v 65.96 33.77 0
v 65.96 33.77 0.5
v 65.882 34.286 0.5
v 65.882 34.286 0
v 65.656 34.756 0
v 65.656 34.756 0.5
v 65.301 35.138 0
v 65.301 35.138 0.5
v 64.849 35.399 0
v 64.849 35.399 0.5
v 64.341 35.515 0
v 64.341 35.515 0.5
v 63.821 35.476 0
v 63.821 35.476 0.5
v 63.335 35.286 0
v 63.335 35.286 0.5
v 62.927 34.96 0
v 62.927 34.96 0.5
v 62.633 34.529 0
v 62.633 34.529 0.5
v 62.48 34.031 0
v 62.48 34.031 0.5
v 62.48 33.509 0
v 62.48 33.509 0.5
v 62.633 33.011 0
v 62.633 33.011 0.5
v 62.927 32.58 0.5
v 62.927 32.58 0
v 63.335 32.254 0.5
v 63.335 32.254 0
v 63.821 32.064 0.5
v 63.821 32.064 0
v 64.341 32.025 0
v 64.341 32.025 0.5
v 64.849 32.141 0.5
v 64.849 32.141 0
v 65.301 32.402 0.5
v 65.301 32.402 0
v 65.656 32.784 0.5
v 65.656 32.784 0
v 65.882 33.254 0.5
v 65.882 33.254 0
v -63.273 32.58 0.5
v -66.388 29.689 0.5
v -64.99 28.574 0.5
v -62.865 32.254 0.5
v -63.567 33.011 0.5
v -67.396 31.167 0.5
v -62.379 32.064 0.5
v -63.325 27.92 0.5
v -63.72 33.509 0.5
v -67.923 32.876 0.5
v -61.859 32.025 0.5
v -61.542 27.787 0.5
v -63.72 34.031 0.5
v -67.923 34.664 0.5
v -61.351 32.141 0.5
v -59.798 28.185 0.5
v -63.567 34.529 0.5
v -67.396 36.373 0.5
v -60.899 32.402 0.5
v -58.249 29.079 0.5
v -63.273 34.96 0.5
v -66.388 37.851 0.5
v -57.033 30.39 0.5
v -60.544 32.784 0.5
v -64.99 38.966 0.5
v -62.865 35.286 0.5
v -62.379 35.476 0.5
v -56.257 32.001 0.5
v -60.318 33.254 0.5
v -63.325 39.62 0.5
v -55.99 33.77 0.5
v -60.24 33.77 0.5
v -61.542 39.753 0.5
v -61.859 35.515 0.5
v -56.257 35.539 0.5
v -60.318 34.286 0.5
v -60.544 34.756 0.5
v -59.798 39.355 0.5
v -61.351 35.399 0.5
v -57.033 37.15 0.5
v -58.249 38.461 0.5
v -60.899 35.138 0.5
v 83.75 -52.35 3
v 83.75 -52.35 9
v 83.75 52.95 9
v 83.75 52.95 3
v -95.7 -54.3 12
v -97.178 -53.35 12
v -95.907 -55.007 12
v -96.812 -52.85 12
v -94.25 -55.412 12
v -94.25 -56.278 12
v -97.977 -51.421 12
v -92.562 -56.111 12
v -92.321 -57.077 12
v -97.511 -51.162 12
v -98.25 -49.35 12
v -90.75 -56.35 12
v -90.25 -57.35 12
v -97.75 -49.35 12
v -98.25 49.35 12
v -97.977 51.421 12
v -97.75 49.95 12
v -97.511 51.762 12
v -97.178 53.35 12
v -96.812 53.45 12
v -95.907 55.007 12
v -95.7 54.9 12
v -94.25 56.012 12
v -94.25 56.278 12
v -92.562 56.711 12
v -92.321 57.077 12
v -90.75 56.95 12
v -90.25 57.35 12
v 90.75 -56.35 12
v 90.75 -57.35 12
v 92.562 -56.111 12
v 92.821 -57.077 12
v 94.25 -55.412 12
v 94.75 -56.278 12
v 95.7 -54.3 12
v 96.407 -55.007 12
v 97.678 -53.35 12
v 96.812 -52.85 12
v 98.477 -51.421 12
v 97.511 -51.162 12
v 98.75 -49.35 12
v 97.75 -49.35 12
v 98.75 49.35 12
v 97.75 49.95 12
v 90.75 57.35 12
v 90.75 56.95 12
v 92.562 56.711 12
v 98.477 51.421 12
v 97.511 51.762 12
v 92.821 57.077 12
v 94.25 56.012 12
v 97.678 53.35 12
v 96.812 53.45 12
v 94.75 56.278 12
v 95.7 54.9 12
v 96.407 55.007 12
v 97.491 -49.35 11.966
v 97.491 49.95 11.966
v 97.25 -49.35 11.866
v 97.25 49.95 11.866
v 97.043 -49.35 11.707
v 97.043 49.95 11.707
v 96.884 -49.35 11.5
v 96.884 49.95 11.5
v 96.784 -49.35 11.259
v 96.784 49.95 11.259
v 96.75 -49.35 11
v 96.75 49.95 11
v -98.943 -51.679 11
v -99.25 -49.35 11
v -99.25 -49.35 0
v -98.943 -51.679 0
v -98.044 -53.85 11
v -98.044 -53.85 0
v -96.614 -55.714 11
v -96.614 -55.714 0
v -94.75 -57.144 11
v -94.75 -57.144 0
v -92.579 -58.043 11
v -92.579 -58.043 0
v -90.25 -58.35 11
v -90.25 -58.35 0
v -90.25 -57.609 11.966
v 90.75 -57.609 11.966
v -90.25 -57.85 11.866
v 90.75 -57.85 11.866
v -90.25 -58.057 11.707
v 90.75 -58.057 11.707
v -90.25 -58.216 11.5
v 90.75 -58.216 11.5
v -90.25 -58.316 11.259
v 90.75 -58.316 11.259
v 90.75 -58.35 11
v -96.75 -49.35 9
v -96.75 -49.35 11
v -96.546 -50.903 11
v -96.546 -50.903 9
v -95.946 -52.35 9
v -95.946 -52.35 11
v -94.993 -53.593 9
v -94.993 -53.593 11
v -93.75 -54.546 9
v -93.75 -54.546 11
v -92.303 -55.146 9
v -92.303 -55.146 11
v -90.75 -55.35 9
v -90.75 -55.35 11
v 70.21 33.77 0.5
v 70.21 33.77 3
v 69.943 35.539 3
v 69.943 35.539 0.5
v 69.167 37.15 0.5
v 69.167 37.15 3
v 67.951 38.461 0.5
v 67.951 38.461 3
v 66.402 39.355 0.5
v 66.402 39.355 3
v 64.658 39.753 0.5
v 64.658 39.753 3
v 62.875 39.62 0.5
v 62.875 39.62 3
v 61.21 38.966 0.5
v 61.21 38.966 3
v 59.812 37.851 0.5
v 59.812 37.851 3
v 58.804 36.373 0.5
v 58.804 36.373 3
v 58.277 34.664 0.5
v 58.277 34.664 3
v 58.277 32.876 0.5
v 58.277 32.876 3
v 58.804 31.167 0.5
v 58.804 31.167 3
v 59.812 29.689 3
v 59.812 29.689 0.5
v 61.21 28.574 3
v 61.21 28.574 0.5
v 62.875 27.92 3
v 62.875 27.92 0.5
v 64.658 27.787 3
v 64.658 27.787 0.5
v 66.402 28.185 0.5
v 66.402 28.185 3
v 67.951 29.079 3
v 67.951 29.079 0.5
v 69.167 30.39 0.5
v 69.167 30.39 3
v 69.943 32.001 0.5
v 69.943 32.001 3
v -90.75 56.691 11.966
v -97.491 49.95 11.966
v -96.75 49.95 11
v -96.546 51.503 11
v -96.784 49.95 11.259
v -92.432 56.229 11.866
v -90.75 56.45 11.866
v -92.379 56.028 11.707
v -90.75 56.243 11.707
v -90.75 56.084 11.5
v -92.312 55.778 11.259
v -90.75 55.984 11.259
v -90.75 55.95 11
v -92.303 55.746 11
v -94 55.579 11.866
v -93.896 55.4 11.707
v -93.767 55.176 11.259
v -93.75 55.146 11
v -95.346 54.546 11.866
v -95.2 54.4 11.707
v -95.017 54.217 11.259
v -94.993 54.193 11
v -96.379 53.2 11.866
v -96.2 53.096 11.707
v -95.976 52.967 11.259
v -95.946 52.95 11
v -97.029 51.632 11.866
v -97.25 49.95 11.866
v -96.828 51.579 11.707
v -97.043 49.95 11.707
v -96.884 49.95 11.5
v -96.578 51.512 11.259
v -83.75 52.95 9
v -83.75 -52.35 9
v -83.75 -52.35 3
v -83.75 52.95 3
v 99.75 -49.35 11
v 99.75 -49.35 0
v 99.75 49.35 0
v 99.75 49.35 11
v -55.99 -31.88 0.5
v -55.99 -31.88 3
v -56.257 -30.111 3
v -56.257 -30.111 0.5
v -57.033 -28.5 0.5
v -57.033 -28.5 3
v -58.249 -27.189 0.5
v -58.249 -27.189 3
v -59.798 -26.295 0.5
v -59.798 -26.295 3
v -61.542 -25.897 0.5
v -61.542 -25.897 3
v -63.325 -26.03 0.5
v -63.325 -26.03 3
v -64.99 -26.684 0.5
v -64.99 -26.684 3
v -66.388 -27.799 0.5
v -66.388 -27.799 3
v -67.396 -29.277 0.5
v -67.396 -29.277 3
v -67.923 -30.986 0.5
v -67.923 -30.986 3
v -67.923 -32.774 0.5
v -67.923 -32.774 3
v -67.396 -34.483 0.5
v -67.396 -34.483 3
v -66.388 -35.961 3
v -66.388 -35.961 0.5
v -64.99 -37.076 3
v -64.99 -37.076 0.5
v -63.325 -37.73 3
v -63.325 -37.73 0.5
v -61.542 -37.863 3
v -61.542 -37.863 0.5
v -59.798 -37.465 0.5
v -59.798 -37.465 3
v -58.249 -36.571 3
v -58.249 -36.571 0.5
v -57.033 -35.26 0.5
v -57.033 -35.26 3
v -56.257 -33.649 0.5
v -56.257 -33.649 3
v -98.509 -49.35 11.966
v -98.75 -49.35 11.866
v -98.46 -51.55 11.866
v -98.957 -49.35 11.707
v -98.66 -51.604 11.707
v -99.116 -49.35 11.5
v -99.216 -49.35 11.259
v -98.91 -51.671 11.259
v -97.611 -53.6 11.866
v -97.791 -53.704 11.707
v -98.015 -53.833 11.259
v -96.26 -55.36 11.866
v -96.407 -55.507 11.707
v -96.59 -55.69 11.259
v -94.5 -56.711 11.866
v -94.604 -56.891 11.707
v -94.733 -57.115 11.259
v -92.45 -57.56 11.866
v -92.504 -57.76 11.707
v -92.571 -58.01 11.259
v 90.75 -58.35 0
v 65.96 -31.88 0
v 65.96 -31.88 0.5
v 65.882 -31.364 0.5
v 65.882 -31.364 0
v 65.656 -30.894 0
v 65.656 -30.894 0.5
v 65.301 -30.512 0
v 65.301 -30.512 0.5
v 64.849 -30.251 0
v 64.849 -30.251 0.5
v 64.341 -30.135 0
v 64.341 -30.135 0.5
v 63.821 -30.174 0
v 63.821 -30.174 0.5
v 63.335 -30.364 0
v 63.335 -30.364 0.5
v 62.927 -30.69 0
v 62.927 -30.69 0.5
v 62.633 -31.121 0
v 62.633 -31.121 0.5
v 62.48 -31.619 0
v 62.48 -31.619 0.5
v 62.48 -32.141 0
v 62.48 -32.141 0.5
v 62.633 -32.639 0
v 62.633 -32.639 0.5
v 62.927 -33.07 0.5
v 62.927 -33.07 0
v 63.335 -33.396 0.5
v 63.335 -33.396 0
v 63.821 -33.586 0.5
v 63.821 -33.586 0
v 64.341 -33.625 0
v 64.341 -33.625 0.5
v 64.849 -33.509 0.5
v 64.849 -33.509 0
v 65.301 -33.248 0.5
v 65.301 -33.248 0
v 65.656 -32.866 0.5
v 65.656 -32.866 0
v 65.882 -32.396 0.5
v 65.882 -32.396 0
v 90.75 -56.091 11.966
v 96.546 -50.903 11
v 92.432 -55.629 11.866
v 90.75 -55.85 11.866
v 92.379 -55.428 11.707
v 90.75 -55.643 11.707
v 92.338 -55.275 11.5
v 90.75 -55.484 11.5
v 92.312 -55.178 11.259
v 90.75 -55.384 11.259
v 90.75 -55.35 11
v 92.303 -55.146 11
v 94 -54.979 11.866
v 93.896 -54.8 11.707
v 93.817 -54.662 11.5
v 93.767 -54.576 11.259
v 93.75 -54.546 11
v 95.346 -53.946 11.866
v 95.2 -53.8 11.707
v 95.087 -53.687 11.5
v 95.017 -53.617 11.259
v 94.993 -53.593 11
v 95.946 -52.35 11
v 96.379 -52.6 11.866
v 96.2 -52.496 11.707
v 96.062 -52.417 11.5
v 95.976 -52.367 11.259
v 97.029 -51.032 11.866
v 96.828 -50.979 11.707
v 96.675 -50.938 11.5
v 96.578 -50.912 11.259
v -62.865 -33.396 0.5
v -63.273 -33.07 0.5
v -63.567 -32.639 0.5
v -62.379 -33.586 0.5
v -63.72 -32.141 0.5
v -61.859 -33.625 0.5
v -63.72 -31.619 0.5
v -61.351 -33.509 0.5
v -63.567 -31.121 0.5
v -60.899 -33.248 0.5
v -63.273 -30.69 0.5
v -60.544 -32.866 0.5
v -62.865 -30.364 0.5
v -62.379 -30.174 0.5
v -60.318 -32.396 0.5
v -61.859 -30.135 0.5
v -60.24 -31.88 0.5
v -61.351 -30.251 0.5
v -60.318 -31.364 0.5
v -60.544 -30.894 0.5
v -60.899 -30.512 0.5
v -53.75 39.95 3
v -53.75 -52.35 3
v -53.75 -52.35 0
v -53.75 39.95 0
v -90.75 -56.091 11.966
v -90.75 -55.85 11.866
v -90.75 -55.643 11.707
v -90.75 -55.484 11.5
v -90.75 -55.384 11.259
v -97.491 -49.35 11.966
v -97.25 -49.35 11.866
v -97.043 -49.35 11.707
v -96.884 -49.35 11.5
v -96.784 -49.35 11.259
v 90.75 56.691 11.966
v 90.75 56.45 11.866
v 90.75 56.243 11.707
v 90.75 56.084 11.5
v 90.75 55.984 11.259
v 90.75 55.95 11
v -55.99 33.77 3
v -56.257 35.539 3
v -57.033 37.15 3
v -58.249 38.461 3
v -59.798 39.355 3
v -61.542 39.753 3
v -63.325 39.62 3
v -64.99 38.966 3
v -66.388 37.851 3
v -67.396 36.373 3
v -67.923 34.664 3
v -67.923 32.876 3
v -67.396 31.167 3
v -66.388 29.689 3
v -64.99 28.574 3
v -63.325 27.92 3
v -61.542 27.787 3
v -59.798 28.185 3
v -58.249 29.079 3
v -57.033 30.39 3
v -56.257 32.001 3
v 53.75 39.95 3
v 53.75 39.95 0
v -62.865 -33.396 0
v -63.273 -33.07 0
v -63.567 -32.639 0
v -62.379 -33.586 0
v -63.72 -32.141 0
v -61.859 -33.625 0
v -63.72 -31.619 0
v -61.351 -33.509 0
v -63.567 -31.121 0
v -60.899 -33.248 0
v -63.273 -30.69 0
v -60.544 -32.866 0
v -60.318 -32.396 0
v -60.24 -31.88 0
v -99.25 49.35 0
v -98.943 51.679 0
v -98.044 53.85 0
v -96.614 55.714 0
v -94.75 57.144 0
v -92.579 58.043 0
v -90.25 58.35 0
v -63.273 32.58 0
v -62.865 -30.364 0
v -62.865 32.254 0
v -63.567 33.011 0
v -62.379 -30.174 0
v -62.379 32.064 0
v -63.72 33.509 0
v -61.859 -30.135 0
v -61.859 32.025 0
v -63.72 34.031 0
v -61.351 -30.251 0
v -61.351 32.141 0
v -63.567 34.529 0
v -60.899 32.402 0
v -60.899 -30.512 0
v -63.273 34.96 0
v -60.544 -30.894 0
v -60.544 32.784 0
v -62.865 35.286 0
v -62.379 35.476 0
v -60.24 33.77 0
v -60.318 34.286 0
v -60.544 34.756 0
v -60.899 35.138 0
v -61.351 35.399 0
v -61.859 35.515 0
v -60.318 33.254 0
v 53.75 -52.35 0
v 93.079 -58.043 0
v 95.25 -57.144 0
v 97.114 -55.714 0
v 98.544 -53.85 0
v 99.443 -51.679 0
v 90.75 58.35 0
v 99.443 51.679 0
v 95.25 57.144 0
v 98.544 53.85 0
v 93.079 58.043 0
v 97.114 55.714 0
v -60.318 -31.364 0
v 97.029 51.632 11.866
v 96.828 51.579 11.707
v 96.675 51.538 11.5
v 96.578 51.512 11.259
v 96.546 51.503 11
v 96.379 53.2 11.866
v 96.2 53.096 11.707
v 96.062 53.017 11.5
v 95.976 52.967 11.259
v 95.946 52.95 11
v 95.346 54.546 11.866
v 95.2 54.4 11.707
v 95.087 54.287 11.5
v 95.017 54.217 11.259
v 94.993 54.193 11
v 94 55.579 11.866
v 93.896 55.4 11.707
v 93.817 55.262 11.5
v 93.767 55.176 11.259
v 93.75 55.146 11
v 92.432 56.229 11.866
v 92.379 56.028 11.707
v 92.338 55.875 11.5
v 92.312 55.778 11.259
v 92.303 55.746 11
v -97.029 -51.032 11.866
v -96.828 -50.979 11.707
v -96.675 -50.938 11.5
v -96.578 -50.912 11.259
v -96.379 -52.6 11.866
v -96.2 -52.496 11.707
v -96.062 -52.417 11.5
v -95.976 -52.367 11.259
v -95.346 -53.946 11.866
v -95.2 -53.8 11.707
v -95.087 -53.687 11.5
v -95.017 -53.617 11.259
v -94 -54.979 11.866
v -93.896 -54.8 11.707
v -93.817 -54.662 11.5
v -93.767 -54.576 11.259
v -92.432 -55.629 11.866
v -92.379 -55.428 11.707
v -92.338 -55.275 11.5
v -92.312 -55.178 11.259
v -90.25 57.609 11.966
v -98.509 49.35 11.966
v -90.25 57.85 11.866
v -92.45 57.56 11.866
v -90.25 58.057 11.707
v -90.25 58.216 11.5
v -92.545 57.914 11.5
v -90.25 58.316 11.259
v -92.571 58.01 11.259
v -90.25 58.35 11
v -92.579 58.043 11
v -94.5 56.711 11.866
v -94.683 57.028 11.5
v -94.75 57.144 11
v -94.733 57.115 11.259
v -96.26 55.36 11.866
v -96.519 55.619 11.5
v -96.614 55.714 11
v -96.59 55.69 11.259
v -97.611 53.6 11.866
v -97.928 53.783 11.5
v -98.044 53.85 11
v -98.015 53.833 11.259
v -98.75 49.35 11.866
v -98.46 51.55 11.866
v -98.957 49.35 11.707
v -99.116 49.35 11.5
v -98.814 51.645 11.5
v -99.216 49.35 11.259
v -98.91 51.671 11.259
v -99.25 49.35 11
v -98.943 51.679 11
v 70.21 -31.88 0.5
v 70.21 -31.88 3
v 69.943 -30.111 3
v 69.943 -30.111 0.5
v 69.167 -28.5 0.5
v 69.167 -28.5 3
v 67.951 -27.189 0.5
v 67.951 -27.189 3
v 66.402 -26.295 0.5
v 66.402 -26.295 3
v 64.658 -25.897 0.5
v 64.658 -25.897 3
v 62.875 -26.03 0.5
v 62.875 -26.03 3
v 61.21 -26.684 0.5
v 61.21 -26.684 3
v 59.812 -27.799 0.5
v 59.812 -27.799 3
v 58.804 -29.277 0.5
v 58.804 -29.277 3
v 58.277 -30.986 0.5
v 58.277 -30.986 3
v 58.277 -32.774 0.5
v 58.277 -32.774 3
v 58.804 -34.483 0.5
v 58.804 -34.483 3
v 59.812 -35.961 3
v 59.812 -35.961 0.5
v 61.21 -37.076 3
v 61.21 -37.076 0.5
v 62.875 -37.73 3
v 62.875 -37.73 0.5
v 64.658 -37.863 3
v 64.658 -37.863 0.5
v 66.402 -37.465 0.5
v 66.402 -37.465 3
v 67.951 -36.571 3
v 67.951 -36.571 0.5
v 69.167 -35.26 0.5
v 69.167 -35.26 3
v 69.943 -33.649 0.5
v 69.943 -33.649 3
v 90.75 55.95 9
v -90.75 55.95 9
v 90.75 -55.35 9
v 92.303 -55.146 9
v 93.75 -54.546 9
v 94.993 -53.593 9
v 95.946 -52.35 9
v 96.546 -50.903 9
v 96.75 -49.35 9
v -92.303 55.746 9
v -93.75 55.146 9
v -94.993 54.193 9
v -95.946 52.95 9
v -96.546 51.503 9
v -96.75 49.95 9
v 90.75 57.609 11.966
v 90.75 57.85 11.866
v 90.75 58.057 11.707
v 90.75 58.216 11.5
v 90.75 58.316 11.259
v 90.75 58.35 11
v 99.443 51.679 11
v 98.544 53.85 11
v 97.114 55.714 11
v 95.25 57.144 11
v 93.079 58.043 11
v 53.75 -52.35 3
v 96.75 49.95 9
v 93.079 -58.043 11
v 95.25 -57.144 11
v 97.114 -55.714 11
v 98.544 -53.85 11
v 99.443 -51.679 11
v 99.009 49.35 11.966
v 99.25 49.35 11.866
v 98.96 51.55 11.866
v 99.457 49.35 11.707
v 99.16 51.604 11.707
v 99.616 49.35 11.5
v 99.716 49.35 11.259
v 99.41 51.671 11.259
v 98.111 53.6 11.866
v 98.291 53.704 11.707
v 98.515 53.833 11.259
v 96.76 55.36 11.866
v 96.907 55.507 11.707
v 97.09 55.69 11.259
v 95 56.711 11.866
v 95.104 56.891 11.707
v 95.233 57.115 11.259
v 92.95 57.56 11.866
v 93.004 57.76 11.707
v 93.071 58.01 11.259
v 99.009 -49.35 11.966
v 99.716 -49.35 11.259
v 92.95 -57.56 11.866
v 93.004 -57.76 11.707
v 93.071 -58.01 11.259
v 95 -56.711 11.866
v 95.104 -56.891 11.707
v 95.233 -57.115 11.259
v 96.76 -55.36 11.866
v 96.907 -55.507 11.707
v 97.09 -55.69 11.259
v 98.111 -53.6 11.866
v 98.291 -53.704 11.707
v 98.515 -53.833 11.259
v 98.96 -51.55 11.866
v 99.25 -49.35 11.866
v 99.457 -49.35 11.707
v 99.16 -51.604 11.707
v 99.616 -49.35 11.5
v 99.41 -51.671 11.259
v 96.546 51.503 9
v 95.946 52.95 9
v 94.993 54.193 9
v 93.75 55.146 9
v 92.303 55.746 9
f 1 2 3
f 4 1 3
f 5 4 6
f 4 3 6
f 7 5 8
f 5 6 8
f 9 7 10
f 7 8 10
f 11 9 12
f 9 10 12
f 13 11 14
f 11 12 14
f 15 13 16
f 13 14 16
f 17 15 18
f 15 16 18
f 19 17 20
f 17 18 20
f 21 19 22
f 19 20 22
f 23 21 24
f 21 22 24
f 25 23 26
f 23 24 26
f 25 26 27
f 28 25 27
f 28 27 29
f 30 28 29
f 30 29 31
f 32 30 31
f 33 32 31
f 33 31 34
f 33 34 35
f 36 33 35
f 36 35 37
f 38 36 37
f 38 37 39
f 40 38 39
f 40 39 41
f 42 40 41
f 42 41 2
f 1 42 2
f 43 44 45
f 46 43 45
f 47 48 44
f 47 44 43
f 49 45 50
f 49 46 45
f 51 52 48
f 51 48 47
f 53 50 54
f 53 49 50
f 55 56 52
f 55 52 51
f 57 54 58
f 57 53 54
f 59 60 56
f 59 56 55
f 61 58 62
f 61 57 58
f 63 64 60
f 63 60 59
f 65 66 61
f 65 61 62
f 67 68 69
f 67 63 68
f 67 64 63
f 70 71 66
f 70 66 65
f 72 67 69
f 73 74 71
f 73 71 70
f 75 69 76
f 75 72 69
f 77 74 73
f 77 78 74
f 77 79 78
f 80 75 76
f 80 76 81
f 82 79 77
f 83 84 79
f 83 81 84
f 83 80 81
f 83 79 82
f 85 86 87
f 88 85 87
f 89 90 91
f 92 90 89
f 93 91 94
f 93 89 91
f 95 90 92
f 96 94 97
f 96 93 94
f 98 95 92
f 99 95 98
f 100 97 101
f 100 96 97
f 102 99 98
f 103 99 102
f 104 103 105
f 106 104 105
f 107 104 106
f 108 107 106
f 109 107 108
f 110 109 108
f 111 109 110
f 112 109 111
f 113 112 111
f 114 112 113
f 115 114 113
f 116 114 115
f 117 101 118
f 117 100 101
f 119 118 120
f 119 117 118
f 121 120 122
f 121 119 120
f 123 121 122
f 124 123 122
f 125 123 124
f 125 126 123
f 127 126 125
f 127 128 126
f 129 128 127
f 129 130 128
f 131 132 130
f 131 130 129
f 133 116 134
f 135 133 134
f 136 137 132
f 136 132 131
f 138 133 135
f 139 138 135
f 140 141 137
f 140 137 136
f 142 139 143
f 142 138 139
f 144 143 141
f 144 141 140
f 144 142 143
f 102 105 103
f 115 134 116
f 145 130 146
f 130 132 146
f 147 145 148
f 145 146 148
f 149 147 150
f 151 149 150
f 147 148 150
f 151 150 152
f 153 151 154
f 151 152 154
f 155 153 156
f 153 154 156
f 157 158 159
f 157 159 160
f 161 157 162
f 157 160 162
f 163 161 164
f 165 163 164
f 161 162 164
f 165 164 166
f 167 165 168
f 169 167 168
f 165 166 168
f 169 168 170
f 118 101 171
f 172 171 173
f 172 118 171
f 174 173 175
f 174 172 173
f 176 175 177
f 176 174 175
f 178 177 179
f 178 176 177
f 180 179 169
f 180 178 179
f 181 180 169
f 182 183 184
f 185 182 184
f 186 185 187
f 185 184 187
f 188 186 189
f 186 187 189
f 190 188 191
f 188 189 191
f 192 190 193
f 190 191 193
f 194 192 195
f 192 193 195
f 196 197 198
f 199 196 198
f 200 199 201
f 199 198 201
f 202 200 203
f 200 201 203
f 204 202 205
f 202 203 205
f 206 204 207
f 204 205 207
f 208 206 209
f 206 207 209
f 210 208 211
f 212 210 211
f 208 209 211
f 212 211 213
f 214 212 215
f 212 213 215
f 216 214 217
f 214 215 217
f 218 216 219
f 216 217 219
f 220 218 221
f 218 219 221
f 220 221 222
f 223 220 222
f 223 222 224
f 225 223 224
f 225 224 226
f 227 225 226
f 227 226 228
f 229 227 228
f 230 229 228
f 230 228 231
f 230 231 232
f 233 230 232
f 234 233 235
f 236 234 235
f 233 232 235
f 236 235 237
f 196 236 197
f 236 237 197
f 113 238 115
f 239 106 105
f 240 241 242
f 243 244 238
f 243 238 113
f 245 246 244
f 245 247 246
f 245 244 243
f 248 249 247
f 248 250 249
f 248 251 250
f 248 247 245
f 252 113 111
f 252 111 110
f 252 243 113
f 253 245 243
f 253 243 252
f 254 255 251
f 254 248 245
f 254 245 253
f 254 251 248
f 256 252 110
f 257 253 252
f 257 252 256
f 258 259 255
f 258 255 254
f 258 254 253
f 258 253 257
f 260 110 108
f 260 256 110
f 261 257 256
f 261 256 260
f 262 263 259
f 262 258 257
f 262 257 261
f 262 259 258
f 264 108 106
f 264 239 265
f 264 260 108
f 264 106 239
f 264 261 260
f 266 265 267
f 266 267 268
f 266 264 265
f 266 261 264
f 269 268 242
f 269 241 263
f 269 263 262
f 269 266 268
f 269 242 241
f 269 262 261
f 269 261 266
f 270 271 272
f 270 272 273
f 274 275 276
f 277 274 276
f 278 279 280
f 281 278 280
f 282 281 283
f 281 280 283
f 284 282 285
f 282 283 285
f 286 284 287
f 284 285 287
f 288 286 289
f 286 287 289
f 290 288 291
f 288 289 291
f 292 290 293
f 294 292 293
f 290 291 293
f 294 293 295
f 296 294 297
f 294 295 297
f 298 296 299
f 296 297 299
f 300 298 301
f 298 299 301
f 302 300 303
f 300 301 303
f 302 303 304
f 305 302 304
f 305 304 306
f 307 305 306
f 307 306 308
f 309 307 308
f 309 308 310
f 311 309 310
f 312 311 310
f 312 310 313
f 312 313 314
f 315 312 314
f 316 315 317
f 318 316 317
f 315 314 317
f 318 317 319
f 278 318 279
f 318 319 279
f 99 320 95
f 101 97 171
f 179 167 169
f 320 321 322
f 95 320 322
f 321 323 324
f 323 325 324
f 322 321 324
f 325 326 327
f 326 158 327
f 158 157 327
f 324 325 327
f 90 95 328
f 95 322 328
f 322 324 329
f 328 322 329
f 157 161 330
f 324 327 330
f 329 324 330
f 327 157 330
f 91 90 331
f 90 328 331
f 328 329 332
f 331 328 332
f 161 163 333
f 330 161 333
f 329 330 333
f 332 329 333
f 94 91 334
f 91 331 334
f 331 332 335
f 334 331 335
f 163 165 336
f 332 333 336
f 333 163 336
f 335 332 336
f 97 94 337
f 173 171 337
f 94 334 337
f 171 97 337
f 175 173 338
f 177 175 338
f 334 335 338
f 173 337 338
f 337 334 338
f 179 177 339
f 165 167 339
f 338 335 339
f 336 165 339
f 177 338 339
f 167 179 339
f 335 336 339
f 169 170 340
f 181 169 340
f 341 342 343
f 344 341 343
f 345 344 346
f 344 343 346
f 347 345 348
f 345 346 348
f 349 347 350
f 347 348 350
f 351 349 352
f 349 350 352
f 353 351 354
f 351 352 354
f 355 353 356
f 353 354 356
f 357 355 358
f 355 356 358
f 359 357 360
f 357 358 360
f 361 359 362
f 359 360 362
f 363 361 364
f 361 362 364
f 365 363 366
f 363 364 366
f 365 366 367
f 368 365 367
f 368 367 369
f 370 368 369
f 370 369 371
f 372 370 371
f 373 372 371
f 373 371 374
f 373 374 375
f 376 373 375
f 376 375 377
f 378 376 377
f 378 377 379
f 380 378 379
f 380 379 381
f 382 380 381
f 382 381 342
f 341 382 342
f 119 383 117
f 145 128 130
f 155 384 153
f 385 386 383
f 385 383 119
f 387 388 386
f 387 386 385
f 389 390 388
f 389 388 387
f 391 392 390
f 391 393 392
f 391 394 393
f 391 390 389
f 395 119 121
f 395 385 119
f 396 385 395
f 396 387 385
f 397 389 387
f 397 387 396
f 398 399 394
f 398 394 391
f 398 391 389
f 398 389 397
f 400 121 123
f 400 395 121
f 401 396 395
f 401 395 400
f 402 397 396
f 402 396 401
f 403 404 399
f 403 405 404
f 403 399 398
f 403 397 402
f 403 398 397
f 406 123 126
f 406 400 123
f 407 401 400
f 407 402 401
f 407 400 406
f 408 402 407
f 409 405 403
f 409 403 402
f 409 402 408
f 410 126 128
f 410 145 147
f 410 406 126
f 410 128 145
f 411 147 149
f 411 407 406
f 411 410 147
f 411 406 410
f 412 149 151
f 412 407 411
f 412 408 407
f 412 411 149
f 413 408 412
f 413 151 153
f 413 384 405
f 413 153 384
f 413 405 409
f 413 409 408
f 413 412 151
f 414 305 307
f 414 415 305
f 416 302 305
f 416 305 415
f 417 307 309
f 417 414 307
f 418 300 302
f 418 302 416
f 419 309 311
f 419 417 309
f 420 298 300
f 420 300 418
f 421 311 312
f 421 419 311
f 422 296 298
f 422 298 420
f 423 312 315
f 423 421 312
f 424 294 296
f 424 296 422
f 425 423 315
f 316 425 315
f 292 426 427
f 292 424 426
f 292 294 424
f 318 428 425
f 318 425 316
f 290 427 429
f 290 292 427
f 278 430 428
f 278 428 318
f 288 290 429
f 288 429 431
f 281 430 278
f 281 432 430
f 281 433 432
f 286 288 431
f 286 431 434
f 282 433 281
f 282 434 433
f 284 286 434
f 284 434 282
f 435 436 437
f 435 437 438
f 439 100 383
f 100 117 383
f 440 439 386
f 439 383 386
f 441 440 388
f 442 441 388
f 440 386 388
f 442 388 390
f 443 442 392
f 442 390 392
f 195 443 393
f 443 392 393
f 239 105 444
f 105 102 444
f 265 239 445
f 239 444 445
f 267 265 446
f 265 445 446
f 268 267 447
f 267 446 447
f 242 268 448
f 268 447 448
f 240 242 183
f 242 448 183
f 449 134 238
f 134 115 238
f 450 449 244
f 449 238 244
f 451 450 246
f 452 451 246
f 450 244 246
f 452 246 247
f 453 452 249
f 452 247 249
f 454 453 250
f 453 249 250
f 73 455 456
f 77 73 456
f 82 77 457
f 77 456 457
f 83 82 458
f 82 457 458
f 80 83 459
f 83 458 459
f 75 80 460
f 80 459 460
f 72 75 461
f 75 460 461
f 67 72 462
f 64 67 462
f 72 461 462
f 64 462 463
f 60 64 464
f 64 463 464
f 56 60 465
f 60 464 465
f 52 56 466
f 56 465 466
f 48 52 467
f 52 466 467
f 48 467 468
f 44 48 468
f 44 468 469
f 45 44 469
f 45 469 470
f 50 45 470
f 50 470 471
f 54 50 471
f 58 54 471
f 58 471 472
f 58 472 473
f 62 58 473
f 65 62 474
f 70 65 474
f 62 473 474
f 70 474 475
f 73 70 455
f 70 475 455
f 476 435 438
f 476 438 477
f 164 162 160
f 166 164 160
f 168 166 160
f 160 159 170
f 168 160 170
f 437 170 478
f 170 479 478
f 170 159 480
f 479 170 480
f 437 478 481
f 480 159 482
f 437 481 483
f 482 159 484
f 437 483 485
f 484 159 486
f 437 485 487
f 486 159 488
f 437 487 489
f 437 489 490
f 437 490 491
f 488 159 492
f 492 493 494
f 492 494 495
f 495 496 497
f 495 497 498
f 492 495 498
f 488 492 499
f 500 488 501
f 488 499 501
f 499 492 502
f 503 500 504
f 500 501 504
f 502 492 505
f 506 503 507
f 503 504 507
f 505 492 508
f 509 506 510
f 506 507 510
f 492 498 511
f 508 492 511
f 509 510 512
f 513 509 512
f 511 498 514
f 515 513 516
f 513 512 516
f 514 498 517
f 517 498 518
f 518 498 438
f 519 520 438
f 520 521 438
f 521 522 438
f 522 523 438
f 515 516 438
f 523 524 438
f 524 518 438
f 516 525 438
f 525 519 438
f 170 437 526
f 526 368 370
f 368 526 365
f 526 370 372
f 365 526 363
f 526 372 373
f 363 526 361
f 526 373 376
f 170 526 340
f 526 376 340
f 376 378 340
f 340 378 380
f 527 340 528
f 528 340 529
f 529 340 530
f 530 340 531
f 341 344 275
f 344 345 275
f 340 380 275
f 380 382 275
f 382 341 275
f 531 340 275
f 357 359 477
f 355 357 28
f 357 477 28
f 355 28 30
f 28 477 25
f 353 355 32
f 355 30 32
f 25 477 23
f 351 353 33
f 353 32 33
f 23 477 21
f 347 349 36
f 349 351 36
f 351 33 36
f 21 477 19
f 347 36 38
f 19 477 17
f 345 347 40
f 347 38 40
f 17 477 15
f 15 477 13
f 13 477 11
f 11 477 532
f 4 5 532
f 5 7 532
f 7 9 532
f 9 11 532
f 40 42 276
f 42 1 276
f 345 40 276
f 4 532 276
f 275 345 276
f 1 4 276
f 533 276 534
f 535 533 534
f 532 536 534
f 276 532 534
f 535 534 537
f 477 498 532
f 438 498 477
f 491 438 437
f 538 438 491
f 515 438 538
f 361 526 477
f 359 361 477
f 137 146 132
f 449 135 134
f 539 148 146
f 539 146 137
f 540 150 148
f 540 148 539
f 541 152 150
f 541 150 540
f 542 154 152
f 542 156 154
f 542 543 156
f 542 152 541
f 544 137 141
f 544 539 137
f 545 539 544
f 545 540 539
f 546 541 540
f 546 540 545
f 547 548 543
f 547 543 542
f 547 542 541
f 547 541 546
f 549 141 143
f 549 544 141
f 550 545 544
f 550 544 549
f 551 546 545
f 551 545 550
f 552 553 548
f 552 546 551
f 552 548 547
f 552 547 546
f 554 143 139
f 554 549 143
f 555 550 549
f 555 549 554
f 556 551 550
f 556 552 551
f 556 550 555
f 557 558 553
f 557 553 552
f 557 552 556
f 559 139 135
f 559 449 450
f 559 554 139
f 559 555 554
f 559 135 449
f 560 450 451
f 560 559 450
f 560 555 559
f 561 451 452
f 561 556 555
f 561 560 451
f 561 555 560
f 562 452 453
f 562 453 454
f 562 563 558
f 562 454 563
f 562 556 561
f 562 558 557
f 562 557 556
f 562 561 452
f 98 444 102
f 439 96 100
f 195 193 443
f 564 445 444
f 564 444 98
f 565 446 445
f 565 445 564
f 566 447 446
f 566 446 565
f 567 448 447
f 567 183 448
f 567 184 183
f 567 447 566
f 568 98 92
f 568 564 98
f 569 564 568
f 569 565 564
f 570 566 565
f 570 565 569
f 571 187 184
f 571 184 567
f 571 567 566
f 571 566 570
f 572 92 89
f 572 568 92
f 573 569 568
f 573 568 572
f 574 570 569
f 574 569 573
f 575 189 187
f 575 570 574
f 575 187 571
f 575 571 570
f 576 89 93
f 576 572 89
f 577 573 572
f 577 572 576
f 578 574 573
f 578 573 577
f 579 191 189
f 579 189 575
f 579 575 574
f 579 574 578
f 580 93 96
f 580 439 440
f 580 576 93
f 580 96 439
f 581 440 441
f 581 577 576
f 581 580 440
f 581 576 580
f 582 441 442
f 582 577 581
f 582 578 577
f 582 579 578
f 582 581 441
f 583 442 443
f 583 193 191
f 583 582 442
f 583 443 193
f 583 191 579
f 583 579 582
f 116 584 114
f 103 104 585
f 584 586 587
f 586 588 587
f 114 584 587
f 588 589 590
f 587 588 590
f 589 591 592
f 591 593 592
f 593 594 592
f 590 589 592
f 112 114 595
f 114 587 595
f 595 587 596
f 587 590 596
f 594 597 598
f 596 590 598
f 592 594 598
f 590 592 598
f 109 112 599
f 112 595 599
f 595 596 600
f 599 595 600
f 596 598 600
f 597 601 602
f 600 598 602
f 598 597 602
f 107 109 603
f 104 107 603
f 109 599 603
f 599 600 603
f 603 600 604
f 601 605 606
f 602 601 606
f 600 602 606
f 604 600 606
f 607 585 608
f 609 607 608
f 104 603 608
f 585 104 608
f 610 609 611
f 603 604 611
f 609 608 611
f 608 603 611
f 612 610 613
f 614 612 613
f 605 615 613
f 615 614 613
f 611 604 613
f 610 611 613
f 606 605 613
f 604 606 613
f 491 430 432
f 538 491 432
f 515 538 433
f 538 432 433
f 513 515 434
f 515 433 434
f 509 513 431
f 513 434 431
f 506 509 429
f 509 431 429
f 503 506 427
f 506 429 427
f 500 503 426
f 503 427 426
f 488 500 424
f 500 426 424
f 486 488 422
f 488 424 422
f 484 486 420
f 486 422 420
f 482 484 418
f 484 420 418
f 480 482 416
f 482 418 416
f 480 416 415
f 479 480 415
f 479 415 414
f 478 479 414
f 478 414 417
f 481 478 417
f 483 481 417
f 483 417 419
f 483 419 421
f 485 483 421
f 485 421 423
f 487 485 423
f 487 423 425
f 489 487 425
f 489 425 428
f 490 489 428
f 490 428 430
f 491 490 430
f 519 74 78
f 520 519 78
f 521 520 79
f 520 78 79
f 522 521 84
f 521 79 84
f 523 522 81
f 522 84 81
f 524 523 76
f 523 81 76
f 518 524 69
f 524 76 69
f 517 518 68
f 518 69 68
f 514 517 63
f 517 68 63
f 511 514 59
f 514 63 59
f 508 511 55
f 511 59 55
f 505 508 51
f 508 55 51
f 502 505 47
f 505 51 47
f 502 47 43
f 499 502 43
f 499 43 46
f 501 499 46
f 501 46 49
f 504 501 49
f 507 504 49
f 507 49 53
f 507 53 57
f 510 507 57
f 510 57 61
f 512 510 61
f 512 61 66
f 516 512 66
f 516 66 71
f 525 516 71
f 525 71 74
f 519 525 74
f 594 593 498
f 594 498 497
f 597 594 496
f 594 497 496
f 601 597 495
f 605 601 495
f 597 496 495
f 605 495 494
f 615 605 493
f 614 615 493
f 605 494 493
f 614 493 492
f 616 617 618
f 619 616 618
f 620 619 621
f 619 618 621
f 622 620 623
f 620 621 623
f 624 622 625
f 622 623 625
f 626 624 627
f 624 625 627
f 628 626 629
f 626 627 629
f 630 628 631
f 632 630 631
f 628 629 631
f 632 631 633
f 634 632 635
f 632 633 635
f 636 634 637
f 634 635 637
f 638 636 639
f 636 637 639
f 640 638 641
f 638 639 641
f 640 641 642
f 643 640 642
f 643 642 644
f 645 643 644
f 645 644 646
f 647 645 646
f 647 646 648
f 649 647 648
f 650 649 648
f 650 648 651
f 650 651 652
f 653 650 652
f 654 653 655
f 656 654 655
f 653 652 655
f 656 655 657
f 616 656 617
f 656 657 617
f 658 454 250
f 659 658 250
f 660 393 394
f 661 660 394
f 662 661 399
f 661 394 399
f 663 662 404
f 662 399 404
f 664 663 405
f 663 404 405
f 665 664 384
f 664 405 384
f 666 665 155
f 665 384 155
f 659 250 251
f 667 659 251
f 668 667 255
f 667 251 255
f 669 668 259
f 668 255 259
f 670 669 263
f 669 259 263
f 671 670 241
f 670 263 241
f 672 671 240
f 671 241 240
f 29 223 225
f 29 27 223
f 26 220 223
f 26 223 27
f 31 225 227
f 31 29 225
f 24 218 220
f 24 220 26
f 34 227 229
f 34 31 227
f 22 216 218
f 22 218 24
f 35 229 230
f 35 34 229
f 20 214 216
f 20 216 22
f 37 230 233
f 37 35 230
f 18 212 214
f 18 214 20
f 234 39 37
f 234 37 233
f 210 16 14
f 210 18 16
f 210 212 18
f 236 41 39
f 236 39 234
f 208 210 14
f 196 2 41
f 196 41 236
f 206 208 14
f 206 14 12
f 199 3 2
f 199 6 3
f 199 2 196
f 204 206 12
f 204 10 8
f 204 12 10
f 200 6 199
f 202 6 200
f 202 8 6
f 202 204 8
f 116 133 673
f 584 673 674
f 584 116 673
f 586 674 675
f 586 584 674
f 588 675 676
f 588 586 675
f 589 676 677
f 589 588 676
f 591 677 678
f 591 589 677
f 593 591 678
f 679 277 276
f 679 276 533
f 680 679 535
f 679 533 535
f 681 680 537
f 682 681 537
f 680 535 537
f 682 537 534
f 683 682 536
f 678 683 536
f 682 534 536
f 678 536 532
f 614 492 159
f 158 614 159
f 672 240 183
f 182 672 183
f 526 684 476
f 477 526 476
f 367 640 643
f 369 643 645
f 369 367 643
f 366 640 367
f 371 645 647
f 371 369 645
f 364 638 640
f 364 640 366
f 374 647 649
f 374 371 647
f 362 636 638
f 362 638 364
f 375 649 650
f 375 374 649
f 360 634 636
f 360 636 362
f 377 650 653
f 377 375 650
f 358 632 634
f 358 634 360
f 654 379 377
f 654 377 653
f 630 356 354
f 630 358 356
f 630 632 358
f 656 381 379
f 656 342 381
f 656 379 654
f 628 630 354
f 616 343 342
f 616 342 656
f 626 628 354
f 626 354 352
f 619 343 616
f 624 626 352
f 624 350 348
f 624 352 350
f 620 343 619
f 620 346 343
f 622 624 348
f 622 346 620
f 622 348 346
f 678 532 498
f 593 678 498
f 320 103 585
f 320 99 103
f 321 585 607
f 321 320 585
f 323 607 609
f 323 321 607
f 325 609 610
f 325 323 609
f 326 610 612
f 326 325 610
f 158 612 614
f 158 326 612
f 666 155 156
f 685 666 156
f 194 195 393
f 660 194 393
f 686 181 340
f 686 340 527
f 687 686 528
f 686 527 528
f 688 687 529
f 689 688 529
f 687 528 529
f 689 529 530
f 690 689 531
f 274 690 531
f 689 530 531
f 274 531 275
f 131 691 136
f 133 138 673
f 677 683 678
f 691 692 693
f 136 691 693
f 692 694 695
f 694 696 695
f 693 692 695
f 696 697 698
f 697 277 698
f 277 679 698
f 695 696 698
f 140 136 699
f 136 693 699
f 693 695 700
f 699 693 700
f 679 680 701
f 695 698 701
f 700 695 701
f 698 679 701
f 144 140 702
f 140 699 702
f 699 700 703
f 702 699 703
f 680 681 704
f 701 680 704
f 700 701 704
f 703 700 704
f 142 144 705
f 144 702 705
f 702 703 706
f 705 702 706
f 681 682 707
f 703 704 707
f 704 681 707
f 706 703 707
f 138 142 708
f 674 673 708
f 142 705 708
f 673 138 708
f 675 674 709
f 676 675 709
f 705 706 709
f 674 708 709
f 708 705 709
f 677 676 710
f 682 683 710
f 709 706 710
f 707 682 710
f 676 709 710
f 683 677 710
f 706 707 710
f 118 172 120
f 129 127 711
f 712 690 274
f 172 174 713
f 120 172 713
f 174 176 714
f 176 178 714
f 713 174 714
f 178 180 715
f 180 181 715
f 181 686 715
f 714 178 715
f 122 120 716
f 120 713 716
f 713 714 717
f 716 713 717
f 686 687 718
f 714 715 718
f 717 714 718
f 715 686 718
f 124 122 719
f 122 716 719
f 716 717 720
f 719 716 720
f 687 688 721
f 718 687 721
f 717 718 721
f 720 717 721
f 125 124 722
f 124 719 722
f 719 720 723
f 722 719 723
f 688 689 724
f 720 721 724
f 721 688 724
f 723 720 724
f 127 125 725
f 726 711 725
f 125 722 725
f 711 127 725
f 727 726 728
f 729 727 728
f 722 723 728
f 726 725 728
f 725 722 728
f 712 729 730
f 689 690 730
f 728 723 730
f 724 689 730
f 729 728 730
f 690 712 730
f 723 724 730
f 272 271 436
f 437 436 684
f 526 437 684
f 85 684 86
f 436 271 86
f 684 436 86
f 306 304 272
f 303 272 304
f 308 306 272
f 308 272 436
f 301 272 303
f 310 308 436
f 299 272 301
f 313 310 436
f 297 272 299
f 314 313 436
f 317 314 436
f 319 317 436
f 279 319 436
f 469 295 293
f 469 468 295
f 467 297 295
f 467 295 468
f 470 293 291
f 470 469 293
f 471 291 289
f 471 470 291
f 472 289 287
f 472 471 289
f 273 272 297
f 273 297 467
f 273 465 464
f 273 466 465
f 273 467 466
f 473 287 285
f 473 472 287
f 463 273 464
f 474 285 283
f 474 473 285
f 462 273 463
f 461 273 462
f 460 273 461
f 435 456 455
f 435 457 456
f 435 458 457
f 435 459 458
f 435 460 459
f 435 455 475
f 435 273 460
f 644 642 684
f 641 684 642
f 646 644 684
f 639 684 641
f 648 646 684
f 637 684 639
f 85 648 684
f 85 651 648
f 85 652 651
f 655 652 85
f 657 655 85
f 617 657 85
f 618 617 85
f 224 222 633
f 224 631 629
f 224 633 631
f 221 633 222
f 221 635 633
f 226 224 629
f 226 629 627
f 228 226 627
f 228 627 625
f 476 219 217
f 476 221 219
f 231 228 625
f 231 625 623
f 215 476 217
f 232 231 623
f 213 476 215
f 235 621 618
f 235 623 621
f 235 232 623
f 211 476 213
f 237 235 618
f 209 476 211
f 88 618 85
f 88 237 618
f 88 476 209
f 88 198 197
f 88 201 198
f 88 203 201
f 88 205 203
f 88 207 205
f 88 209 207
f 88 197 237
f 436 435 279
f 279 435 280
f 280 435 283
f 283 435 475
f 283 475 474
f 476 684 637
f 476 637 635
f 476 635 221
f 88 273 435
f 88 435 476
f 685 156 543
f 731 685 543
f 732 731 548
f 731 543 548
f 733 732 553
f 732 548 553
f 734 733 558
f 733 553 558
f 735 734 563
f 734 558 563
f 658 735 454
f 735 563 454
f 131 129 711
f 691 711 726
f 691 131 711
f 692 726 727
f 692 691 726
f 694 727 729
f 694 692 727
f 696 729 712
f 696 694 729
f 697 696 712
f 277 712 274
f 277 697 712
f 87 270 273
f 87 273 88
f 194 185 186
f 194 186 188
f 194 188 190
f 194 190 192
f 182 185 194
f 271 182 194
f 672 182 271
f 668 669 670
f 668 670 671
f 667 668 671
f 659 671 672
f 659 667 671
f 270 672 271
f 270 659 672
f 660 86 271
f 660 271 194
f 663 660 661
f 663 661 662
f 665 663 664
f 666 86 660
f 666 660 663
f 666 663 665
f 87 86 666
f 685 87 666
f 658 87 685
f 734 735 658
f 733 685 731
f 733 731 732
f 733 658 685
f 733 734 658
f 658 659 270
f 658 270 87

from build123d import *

# Parameters (mm, degrees)
F1_DEPTH  = 12
F2_R      = 1.75
F3_DEPTH  = 25
F4_R      = 1.75
F5_DEPTH  = 3
F6_R      = 1
F7_W      = 167.5
F7_H      = 105.3
F8_DEPTH  = 6
F9_W      = 107.5
F9_H      = 92.3
F10_DEPTH = 6
F11_R     = 6
F12_DEPTH = 2.5


with BuildPart() as f1:
    # F0 (on Top) → F1 (new body)
    with BuildSketch(Plane.XY):
        with BuildLine():
            Line((90.75, 58.35), (-90.25, 58.35))
            ThreePointArc((-90.25, 58.35), (-96.613961, 55.713961), (-99.25, 49.35))
            Line((-99.25, 49.35), (-99.25, -49.35))
            ThreePointArc((-99.25, -49.35), (-96.613961, -55.713961), (-90.25, -58.35))
            Line((-90.25, -58.35), (90.75, -58.35))
            ThreePointArc((90.75, -58.35), (97.113961, -55.713961), (99.75, -49.35))
            Line((99.75, -49.35), (99.75, 49.35))
            ThreePointArc((99.75, 49.35), (97.113961, 55.713961), (90.75, 58.35))
        make_face()
    extrude(amount=F1_DEPTH)

    # F2 (on face) → F3 (cut)
    with BuildSketch(Plane.XY.offset(12)):
        with Locations((-61.99, 33.77)):
            Circle(F2_R)
        with Locations((64.21, 33.77)):
            Circle(F2_R)
        with Locations((64.21, -31.88)):
            Circle(F2_R)
        with Locations((-61.99, -31.88)):
            Circle(F2_R)
    extrude(amount=-F3_DEPTH, mode=Mode.SUBTRACT)

    # F4 (on face) → F5 (cut)
    with BuildSketch(Plane.XY.offset(12)):
        with BuildLine():
            Line((90.75, 55.95), (-90.75, 55.95))
            ThreePointArc((-90.75, 55.95), (-94.992641, 54.192641), (-96.75, 49.95))
            Line((-96.75, 49.95), (-96.75, -49.35))
            ThreePointArc((-96.75, -49.35), (-94.992641, -53.592641), (-90.75, -55.35))
            Line((-90.75, -55.35), (90.75, -55.35))
            ThreePointArc((90.75, -55.35), (94.992641, -53.592641), (96.75, -49.35))
            Line((96.75, -49.35), (96.75, 49.95))
            ThreePointArc((96.75, 49.95), (94.992641, 54.192641), (90.75, 55.95))
        make_face()
        with Locations((-61.99, -31.88)):
            Circle(F4_R, mode=Mode.SUBTRACT)
        with Locations((64.21, -31.88)):
            Circle(F4_R, mode=Mode.SUBTRACT)
        with Locations((-61.99, 33.77)):
            Circle(F4_R, mode=Mode.SUBTRACT)
        with Locations((64.21, 33.77)):
            Circle(F4_R, mode=Mode.SUBTRACT)
    extrude(amount=-F5_DEPTH, mode=Mode.SUBTRACT)

    # F6
    f6_edges = [f1.edges().sort_by_distance(p)[0] for p in [
        (-99.25, 0, 12),
        (-96.75, 0.3, 12),
        (-96.613961, 55.713961, 12),
        (0, 55.95, 12),
        (0.25, 58.35, 12),
        (94.992641, 54.192641, 12),
        (99.75, 0, 12),
        (96.75, 0.3, 12),
        (97.113961, -55.713961, 12),
        (94.992641, -53.592641, 12),
        (0.25, -58.35, 12),
        (0, -55.35, 12),
        (-94.992641, -53.592641, 12),
        (-96.613961, -55.713961, 12),
        (97.113961, 55.713961, 12),
        (-94.992641, 54.192641, 12),
    ]]
    fillet(f6_edges, radius=F6_R)

    # F7 (on face) → F8 (cut)
    with BuildSketch(Plane.XY.offset(9)):
        with Locations((0, 0.3)):
            Rectangle(F7_W, F7_H)
    extrude(amount=-F8_DEPTH, mode=Mode.SUBTRACT)

    # F9 (on face) → F10 (cut)
    with BuildSketch(Plane.XY.offset(3)):
        with Locations((0, -6.2)):
            Rectangle(F9_W, F9_H)
    extrude(amount=-F10_DEPTH, mode=Mode.SUBTRACT)

    # F11 (on face) → F12 (cut)
    with BuildSketch(Plane.XY.offset(3)):
        with Locations((-61.99, 33.77)):
            Circle(F11_R)
        with Locations((-61.99, -31.88)):
            Circle(F11_R)
        with Locations((64.21, 33.77)):
            Circle(F11_R)
        with Locations((64.21, -31.88)):
            Circle(F11_R)
    extrude(amount=-F12_DEPTH, mode=Mode.SUBTRACT)


solid = f1.part
